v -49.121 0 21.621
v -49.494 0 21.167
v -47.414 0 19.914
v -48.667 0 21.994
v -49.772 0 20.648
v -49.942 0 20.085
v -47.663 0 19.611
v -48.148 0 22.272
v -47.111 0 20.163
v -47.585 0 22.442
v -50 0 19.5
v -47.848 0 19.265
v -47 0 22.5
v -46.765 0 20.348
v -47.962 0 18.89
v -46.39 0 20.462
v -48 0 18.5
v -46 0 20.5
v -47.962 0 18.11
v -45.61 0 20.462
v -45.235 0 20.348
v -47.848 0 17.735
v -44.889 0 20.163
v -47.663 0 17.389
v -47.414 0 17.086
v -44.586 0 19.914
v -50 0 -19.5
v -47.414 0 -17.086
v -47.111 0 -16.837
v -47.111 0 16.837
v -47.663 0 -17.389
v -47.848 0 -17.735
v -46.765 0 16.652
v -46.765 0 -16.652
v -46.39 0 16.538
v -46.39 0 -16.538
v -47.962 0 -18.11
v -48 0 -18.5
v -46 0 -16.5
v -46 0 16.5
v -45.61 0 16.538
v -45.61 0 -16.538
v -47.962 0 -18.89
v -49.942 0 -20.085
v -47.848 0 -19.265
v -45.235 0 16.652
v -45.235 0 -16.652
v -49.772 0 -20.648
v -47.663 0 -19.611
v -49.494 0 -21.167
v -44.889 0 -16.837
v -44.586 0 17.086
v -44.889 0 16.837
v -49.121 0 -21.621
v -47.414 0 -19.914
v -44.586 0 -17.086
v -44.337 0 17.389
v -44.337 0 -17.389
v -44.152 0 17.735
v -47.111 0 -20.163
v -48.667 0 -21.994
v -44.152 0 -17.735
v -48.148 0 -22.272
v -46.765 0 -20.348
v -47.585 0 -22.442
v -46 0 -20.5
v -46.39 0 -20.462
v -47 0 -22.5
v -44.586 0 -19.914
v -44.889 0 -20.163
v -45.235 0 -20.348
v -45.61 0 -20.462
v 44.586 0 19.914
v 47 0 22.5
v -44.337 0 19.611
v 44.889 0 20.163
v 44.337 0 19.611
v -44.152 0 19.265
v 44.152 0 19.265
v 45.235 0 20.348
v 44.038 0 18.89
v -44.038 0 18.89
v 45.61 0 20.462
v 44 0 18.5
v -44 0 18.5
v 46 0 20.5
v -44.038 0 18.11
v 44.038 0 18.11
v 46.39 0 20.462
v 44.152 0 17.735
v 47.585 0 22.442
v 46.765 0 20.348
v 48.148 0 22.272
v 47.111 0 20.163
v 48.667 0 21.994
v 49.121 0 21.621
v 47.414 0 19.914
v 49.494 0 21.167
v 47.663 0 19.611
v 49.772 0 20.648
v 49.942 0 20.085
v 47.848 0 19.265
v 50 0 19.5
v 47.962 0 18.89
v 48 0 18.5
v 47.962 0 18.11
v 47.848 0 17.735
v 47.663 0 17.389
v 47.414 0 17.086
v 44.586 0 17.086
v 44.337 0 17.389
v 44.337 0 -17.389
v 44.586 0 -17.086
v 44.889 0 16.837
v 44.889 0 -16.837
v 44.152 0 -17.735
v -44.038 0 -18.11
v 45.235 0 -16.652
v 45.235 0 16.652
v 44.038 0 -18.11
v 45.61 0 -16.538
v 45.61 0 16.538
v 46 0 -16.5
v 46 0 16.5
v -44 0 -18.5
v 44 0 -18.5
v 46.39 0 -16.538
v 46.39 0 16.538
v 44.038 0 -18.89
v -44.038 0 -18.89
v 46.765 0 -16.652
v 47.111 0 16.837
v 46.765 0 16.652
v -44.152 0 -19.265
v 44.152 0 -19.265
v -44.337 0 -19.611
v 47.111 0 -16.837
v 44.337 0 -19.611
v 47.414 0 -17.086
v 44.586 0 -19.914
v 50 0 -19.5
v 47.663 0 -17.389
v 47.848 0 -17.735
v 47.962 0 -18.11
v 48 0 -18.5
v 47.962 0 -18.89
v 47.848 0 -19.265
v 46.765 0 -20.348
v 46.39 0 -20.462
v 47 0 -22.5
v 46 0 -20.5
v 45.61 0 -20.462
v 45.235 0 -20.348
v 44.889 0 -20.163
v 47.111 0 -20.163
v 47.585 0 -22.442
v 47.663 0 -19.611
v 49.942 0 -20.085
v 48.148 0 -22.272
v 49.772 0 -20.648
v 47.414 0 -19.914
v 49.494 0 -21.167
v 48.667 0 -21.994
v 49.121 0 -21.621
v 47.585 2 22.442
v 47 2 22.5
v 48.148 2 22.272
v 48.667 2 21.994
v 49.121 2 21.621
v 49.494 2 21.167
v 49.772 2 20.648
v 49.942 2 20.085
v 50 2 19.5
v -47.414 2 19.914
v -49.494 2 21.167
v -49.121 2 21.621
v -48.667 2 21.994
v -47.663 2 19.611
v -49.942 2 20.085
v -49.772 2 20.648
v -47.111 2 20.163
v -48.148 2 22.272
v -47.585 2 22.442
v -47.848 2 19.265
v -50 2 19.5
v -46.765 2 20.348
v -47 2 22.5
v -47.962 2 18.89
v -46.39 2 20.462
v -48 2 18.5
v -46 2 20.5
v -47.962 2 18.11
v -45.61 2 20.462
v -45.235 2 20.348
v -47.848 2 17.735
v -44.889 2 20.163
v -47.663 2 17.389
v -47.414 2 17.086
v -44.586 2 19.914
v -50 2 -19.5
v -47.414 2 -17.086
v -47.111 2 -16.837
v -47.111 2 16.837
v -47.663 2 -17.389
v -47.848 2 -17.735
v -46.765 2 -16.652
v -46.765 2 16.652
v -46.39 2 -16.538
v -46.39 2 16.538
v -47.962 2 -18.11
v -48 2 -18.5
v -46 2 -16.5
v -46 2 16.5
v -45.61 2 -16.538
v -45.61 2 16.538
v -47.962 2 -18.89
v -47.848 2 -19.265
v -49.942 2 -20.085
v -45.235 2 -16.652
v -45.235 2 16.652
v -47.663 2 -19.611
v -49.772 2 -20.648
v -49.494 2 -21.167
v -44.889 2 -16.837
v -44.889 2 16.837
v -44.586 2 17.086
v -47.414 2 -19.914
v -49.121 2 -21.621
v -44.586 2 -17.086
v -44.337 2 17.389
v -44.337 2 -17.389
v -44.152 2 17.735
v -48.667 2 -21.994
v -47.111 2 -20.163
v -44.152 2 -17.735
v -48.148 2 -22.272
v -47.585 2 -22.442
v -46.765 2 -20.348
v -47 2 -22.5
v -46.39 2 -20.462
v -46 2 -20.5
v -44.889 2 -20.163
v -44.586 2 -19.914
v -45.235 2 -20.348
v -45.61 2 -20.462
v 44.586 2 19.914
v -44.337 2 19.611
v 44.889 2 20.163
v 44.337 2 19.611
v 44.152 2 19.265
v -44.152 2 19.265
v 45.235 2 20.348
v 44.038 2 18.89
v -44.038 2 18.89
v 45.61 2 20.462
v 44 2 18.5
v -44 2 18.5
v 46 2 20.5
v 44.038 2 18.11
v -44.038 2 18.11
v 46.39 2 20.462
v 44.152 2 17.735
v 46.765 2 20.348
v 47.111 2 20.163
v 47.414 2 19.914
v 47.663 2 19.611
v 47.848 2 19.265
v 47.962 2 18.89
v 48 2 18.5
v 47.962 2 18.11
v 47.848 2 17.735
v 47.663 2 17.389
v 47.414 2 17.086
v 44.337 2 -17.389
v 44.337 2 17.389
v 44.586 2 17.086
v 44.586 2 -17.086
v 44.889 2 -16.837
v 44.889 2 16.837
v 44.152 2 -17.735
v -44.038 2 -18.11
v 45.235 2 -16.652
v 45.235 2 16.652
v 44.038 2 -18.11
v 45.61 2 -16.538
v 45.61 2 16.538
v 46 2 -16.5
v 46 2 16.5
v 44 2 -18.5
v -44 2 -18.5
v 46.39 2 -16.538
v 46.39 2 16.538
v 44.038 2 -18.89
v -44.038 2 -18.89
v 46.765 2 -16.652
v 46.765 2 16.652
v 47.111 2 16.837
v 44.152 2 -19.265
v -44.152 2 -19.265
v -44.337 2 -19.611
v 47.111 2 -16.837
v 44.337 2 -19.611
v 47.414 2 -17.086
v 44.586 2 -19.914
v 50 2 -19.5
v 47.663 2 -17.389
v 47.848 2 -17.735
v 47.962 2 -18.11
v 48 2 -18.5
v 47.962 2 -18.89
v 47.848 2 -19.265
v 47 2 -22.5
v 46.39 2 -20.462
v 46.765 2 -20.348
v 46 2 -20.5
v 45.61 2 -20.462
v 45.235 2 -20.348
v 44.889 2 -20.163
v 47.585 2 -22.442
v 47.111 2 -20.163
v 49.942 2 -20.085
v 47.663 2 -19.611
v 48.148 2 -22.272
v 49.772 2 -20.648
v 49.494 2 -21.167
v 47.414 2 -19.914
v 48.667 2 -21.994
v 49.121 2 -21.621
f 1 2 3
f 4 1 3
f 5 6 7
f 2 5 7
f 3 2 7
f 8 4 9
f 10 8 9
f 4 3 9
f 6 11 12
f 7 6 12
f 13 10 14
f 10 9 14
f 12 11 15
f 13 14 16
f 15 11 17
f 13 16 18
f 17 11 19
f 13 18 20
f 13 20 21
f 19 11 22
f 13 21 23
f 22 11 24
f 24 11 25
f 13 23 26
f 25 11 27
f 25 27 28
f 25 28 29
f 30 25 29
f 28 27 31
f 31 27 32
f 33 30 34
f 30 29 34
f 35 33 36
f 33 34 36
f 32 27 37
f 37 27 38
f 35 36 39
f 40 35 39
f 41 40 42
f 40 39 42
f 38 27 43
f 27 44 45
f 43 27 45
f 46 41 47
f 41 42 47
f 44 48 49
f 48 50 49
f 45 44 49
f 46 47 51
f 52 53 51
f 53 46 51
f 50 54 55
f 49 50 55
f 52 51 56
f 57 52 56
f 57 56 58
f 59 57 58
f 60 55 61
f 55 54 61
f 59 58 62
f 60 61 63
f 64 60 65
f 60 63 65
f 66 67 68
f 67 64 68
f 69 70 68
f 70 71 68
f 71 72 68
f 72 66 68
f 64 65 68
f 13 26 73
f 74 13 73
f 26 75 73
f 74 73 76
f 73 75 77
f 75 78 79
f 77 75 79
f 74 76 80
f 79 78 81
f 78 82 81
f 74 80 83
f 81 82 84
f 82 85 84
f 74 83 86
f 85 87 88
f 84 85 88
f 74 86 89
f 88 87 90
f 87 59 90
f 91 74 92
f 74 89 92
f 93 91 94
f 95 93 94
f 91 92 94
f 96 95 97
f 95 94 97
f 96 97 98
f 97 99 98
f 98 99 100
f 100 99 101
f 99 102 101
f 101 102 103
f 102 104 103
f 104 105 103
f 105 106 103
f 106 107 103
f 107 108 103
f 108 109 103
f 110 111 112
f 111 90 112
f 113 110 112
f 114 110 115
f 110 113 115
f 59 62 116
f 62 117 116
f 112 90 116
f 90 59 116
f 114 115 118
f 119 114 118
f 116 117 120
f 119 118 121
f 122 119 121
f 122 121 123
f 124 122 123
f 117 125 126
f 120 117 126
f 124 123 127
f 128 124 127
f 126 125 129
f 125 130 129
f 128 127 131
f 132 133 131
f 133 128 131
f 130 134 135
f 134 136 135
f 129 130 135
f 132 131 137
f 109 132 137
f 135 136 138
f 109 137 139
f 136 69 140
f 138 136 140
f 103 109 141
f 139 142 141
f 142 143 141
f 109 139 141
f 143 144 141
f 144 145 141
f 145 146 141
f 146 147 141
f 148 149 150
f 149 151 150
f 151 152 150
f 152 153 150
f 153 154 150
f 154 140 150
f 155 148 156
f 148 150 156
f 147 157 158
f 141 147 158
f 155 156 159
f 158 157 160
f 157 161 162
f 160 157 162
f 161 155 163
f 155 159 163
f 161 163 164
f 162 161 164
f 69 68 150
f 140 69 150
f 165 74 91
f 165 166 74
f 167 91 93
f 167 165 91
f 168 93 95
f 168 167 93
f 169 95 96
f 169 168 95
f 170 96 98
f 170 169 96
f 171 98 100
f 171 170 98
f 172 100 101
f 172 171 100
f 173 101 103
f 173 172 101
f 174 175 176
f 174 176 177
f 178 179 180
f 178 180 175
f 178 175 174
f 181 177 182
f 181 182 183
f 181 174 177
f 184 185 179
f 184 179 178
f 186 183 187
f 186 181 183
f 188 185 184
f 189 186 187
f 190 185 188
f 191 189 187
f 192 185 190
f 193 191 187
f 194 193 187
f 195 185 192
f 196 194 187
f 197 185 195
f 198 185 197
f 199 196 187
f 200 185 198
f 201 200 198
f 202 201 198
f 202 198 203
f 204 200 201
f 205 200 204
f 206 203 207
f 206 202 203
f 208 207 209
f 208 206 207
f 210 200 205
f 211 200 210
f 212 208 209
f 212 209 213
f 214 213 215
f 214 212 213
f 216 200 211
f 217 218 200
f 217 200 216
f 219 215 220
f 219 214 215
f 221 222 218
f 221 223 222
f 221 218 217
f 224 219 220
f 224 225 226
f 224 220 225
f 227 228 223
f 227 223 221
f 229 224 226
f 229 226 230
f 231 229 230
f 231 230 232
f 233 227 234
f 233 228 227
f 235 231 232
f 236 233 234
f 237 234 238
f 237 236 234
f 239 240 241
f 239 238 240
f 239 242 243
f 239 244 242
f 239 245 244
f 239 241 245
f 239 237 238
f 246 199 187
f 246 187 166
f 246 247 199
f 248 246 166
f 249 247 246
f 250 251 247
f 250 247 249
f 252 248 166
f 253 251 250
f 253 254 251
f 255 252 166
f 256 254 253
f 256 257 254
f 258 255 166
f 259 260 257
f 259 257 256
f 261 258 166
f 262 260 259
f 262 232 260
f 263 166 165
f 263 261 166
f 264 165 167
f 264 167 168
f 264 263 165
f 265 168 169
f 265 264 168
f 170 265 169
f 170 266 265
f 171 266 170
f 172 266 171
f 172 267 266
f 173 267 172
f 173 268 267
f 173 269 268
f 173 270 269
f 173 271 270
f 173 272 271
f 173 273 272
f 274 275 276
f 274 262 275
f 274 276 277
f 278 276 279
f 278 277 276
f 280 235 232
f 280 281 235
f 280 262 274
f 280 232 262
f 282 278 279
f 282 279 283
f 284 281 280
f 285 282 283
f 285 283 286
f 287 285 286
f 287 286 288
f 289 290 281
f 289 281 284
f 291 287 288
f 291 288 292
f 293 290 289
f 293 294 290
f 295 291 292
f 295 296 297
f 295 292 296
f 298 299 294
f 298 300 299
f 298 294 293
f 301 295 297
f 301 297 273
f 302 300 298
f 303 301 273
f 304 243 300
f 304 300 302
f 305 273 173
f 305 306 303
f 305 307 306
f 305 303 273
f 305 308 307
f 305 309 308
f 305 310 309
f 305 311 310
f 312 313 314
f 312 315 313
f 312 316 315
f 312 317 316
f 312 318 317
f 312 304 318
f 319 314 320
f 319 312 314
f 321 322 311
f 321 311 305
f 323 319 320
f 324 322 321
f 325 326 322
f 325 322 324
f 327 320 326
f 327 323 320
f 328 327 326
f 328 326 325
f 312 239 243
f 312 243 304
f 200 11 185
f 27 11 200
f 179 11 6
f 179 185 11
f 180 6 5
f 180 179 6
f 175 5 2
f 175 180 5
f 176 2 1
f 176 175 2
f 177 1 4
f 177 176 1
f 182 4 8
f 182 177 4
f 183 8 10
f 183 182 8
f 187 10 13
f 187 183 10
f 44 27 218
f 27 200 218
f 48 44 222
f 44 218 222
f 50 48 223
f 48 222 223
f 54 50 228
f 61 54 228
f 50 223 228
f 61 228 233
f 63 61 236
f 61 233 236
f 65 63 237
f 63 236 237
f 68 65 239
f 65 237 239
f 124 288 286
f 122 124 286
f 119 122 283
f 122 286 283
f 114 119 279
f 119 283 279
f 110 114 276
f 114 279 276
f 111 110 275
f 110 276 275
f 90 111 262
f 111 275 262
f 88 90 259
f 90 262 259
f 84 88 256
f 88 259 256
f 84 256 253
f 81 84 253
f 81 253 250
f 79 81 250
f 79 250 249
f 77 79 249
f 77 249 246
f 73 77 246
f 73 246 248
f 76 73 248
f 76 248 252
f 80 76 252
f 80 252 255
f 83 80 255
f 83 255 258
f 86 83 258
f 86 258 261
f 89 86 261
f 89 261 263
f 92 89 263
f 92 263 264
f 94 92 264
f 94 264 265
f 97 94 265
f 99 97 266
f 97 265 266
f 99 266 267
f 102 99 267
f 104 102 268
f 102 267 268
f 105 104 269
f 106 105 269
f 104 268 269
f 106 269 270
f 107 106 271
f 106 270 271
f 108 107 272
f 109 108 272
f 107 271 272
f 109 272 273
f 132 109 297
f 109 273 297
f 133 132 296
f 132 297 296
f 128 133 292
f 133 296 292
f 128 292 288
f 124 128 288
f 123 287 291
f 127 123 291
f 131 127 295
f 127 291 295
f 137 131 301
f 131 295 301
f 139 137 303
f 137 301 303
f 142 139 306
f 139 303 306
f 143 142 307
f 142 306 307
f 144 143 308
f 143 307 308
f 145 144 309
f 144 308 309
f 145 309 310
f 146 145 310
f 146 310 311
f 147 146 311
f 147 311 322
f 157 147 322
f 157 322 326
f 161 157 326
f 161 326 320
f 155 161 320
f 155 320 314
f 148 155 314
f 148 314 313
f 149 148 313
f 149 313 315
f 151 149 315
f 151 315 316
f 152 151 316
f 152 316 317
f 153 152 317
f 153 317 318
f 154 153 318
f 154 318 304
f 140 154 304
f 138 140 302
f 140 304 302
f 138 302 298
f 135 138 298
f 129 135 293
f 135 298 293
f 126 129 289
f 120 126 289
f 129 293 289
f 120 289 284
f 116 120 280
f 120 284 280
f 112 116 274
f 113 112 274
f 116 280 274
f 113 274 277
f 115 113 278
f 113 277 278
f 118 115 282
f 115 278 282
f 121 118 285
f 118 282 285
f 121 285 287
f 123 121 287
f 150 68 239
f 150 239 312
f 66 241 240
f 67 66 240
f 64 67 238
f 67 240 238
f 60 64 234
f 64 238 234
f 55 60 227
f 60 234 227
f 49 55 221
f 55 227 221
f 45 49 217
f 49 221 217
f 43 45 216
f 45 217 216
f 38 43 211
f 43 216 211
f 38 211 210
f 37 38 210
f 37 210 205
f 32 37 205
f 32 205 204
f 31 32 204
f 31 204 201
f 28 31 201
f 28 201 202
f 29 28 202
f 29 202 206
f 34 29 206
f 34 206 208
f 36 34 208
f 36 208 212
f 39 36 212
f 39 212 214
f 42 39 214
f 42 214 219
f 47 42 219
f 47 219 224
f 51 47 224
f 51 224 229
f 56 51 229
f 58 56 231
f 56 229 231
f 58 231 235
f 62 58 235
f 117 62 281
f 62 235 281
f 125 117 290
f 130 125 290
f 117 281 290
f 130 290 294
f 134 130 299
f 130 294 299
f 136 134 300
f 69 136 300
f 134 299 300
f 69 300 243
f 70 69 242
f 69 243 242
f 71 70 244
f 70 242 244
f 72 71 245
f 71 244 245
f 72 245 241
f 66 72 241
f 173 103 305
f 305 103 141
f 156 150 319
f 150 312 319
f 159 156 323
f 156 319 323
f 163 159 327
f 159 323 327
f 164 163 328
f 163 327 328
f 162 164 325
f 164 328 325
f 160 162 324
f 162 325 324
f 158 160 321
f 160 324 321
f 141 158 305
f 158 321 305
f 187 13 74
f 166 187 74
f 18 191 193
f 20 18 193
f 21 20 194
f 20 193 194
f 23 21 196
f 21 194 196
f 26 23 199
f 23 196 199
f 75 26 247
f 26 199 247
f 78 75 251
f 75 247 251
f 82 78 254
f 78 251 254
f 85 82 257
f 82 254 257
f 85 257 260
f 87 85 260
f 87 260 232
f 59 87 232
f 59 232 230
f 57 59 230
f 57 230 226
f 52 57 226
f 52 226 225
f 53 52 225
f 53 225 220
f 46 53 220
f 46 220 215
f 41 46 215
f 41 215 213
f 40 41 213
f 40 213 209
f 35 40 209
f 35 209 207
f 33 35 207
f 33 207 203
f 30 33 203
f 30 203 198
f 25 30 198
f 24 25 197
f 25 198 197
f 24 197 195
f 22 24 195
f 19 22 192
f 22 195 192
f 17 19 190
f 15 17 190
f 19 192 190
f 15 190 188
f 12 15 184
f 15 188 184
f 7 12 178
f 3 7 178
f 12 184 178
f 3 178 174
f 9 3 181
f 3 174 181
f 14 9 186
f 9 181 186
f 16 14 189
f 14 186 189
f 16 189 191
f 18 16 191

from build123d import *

# Parameters (mm, degrees)
ESBO_O1_W                = 100
ESBO_O1_H                = 45
RESSALTO_EXTRUS_O1_DEPTH = 2
ESBO_O5_R                = 2
CORTE_EXTRUS_O3_DEPTH    = 55.865745233
FILETE1_R                = 3


with BuildPart() as part:
    # Esboço1 → Ressalto-extrusão1 (new body)
    with BuildSketch(Plane(origin=(0, 0, 0), x_dir=(1, 0, 0), z_dir=(0, 1, 0))):
        Rectangle(ESBO_O1_W, ESBO_O1_H)
    extrude(amount=RESSALTO_EXTRUS_O1_DEPTH)

    # Esboço5 → Corte-extrusão3 (cut, through all)
    with BuildSketch(Plane(origin=(0, 2, 0), x_dir=(1, 0, 0), z_dir=(0, 1, 0))):
        with Locations(Location((46, 18.5, 0), (0, 0, 270))):
            Circle(ESBO_O5_R)
        with Locations(Location((46, -18.5, 0), (0, 0, 90))):
            Circle(ESBO_O5_R)
        with Locations(Location((-46, -18.5, 0), (0, 0, 270))):
            Circle(ESBO_O5_R)
        with Locations(Location((-46, 18.5, 0), (0, 0, 90))):
            Circle(ESBO_O5_R)
    extrude(amount=-CORTE_EXTRUS_O3_DEPTH, mode=Mode.SUBTRACT)

    # Filete1
    filete1_edges = [part.edges().sort_by_distance(p)[0] for p in [
        (-50, 1, -22.5),
        (50, 1, -22.5),
        (50, 1, 22.5),
        (-50, 1, 22.5),
    ]]
    fillet(filete1_edges, radius=FILETE1_R)


solid = part.part
